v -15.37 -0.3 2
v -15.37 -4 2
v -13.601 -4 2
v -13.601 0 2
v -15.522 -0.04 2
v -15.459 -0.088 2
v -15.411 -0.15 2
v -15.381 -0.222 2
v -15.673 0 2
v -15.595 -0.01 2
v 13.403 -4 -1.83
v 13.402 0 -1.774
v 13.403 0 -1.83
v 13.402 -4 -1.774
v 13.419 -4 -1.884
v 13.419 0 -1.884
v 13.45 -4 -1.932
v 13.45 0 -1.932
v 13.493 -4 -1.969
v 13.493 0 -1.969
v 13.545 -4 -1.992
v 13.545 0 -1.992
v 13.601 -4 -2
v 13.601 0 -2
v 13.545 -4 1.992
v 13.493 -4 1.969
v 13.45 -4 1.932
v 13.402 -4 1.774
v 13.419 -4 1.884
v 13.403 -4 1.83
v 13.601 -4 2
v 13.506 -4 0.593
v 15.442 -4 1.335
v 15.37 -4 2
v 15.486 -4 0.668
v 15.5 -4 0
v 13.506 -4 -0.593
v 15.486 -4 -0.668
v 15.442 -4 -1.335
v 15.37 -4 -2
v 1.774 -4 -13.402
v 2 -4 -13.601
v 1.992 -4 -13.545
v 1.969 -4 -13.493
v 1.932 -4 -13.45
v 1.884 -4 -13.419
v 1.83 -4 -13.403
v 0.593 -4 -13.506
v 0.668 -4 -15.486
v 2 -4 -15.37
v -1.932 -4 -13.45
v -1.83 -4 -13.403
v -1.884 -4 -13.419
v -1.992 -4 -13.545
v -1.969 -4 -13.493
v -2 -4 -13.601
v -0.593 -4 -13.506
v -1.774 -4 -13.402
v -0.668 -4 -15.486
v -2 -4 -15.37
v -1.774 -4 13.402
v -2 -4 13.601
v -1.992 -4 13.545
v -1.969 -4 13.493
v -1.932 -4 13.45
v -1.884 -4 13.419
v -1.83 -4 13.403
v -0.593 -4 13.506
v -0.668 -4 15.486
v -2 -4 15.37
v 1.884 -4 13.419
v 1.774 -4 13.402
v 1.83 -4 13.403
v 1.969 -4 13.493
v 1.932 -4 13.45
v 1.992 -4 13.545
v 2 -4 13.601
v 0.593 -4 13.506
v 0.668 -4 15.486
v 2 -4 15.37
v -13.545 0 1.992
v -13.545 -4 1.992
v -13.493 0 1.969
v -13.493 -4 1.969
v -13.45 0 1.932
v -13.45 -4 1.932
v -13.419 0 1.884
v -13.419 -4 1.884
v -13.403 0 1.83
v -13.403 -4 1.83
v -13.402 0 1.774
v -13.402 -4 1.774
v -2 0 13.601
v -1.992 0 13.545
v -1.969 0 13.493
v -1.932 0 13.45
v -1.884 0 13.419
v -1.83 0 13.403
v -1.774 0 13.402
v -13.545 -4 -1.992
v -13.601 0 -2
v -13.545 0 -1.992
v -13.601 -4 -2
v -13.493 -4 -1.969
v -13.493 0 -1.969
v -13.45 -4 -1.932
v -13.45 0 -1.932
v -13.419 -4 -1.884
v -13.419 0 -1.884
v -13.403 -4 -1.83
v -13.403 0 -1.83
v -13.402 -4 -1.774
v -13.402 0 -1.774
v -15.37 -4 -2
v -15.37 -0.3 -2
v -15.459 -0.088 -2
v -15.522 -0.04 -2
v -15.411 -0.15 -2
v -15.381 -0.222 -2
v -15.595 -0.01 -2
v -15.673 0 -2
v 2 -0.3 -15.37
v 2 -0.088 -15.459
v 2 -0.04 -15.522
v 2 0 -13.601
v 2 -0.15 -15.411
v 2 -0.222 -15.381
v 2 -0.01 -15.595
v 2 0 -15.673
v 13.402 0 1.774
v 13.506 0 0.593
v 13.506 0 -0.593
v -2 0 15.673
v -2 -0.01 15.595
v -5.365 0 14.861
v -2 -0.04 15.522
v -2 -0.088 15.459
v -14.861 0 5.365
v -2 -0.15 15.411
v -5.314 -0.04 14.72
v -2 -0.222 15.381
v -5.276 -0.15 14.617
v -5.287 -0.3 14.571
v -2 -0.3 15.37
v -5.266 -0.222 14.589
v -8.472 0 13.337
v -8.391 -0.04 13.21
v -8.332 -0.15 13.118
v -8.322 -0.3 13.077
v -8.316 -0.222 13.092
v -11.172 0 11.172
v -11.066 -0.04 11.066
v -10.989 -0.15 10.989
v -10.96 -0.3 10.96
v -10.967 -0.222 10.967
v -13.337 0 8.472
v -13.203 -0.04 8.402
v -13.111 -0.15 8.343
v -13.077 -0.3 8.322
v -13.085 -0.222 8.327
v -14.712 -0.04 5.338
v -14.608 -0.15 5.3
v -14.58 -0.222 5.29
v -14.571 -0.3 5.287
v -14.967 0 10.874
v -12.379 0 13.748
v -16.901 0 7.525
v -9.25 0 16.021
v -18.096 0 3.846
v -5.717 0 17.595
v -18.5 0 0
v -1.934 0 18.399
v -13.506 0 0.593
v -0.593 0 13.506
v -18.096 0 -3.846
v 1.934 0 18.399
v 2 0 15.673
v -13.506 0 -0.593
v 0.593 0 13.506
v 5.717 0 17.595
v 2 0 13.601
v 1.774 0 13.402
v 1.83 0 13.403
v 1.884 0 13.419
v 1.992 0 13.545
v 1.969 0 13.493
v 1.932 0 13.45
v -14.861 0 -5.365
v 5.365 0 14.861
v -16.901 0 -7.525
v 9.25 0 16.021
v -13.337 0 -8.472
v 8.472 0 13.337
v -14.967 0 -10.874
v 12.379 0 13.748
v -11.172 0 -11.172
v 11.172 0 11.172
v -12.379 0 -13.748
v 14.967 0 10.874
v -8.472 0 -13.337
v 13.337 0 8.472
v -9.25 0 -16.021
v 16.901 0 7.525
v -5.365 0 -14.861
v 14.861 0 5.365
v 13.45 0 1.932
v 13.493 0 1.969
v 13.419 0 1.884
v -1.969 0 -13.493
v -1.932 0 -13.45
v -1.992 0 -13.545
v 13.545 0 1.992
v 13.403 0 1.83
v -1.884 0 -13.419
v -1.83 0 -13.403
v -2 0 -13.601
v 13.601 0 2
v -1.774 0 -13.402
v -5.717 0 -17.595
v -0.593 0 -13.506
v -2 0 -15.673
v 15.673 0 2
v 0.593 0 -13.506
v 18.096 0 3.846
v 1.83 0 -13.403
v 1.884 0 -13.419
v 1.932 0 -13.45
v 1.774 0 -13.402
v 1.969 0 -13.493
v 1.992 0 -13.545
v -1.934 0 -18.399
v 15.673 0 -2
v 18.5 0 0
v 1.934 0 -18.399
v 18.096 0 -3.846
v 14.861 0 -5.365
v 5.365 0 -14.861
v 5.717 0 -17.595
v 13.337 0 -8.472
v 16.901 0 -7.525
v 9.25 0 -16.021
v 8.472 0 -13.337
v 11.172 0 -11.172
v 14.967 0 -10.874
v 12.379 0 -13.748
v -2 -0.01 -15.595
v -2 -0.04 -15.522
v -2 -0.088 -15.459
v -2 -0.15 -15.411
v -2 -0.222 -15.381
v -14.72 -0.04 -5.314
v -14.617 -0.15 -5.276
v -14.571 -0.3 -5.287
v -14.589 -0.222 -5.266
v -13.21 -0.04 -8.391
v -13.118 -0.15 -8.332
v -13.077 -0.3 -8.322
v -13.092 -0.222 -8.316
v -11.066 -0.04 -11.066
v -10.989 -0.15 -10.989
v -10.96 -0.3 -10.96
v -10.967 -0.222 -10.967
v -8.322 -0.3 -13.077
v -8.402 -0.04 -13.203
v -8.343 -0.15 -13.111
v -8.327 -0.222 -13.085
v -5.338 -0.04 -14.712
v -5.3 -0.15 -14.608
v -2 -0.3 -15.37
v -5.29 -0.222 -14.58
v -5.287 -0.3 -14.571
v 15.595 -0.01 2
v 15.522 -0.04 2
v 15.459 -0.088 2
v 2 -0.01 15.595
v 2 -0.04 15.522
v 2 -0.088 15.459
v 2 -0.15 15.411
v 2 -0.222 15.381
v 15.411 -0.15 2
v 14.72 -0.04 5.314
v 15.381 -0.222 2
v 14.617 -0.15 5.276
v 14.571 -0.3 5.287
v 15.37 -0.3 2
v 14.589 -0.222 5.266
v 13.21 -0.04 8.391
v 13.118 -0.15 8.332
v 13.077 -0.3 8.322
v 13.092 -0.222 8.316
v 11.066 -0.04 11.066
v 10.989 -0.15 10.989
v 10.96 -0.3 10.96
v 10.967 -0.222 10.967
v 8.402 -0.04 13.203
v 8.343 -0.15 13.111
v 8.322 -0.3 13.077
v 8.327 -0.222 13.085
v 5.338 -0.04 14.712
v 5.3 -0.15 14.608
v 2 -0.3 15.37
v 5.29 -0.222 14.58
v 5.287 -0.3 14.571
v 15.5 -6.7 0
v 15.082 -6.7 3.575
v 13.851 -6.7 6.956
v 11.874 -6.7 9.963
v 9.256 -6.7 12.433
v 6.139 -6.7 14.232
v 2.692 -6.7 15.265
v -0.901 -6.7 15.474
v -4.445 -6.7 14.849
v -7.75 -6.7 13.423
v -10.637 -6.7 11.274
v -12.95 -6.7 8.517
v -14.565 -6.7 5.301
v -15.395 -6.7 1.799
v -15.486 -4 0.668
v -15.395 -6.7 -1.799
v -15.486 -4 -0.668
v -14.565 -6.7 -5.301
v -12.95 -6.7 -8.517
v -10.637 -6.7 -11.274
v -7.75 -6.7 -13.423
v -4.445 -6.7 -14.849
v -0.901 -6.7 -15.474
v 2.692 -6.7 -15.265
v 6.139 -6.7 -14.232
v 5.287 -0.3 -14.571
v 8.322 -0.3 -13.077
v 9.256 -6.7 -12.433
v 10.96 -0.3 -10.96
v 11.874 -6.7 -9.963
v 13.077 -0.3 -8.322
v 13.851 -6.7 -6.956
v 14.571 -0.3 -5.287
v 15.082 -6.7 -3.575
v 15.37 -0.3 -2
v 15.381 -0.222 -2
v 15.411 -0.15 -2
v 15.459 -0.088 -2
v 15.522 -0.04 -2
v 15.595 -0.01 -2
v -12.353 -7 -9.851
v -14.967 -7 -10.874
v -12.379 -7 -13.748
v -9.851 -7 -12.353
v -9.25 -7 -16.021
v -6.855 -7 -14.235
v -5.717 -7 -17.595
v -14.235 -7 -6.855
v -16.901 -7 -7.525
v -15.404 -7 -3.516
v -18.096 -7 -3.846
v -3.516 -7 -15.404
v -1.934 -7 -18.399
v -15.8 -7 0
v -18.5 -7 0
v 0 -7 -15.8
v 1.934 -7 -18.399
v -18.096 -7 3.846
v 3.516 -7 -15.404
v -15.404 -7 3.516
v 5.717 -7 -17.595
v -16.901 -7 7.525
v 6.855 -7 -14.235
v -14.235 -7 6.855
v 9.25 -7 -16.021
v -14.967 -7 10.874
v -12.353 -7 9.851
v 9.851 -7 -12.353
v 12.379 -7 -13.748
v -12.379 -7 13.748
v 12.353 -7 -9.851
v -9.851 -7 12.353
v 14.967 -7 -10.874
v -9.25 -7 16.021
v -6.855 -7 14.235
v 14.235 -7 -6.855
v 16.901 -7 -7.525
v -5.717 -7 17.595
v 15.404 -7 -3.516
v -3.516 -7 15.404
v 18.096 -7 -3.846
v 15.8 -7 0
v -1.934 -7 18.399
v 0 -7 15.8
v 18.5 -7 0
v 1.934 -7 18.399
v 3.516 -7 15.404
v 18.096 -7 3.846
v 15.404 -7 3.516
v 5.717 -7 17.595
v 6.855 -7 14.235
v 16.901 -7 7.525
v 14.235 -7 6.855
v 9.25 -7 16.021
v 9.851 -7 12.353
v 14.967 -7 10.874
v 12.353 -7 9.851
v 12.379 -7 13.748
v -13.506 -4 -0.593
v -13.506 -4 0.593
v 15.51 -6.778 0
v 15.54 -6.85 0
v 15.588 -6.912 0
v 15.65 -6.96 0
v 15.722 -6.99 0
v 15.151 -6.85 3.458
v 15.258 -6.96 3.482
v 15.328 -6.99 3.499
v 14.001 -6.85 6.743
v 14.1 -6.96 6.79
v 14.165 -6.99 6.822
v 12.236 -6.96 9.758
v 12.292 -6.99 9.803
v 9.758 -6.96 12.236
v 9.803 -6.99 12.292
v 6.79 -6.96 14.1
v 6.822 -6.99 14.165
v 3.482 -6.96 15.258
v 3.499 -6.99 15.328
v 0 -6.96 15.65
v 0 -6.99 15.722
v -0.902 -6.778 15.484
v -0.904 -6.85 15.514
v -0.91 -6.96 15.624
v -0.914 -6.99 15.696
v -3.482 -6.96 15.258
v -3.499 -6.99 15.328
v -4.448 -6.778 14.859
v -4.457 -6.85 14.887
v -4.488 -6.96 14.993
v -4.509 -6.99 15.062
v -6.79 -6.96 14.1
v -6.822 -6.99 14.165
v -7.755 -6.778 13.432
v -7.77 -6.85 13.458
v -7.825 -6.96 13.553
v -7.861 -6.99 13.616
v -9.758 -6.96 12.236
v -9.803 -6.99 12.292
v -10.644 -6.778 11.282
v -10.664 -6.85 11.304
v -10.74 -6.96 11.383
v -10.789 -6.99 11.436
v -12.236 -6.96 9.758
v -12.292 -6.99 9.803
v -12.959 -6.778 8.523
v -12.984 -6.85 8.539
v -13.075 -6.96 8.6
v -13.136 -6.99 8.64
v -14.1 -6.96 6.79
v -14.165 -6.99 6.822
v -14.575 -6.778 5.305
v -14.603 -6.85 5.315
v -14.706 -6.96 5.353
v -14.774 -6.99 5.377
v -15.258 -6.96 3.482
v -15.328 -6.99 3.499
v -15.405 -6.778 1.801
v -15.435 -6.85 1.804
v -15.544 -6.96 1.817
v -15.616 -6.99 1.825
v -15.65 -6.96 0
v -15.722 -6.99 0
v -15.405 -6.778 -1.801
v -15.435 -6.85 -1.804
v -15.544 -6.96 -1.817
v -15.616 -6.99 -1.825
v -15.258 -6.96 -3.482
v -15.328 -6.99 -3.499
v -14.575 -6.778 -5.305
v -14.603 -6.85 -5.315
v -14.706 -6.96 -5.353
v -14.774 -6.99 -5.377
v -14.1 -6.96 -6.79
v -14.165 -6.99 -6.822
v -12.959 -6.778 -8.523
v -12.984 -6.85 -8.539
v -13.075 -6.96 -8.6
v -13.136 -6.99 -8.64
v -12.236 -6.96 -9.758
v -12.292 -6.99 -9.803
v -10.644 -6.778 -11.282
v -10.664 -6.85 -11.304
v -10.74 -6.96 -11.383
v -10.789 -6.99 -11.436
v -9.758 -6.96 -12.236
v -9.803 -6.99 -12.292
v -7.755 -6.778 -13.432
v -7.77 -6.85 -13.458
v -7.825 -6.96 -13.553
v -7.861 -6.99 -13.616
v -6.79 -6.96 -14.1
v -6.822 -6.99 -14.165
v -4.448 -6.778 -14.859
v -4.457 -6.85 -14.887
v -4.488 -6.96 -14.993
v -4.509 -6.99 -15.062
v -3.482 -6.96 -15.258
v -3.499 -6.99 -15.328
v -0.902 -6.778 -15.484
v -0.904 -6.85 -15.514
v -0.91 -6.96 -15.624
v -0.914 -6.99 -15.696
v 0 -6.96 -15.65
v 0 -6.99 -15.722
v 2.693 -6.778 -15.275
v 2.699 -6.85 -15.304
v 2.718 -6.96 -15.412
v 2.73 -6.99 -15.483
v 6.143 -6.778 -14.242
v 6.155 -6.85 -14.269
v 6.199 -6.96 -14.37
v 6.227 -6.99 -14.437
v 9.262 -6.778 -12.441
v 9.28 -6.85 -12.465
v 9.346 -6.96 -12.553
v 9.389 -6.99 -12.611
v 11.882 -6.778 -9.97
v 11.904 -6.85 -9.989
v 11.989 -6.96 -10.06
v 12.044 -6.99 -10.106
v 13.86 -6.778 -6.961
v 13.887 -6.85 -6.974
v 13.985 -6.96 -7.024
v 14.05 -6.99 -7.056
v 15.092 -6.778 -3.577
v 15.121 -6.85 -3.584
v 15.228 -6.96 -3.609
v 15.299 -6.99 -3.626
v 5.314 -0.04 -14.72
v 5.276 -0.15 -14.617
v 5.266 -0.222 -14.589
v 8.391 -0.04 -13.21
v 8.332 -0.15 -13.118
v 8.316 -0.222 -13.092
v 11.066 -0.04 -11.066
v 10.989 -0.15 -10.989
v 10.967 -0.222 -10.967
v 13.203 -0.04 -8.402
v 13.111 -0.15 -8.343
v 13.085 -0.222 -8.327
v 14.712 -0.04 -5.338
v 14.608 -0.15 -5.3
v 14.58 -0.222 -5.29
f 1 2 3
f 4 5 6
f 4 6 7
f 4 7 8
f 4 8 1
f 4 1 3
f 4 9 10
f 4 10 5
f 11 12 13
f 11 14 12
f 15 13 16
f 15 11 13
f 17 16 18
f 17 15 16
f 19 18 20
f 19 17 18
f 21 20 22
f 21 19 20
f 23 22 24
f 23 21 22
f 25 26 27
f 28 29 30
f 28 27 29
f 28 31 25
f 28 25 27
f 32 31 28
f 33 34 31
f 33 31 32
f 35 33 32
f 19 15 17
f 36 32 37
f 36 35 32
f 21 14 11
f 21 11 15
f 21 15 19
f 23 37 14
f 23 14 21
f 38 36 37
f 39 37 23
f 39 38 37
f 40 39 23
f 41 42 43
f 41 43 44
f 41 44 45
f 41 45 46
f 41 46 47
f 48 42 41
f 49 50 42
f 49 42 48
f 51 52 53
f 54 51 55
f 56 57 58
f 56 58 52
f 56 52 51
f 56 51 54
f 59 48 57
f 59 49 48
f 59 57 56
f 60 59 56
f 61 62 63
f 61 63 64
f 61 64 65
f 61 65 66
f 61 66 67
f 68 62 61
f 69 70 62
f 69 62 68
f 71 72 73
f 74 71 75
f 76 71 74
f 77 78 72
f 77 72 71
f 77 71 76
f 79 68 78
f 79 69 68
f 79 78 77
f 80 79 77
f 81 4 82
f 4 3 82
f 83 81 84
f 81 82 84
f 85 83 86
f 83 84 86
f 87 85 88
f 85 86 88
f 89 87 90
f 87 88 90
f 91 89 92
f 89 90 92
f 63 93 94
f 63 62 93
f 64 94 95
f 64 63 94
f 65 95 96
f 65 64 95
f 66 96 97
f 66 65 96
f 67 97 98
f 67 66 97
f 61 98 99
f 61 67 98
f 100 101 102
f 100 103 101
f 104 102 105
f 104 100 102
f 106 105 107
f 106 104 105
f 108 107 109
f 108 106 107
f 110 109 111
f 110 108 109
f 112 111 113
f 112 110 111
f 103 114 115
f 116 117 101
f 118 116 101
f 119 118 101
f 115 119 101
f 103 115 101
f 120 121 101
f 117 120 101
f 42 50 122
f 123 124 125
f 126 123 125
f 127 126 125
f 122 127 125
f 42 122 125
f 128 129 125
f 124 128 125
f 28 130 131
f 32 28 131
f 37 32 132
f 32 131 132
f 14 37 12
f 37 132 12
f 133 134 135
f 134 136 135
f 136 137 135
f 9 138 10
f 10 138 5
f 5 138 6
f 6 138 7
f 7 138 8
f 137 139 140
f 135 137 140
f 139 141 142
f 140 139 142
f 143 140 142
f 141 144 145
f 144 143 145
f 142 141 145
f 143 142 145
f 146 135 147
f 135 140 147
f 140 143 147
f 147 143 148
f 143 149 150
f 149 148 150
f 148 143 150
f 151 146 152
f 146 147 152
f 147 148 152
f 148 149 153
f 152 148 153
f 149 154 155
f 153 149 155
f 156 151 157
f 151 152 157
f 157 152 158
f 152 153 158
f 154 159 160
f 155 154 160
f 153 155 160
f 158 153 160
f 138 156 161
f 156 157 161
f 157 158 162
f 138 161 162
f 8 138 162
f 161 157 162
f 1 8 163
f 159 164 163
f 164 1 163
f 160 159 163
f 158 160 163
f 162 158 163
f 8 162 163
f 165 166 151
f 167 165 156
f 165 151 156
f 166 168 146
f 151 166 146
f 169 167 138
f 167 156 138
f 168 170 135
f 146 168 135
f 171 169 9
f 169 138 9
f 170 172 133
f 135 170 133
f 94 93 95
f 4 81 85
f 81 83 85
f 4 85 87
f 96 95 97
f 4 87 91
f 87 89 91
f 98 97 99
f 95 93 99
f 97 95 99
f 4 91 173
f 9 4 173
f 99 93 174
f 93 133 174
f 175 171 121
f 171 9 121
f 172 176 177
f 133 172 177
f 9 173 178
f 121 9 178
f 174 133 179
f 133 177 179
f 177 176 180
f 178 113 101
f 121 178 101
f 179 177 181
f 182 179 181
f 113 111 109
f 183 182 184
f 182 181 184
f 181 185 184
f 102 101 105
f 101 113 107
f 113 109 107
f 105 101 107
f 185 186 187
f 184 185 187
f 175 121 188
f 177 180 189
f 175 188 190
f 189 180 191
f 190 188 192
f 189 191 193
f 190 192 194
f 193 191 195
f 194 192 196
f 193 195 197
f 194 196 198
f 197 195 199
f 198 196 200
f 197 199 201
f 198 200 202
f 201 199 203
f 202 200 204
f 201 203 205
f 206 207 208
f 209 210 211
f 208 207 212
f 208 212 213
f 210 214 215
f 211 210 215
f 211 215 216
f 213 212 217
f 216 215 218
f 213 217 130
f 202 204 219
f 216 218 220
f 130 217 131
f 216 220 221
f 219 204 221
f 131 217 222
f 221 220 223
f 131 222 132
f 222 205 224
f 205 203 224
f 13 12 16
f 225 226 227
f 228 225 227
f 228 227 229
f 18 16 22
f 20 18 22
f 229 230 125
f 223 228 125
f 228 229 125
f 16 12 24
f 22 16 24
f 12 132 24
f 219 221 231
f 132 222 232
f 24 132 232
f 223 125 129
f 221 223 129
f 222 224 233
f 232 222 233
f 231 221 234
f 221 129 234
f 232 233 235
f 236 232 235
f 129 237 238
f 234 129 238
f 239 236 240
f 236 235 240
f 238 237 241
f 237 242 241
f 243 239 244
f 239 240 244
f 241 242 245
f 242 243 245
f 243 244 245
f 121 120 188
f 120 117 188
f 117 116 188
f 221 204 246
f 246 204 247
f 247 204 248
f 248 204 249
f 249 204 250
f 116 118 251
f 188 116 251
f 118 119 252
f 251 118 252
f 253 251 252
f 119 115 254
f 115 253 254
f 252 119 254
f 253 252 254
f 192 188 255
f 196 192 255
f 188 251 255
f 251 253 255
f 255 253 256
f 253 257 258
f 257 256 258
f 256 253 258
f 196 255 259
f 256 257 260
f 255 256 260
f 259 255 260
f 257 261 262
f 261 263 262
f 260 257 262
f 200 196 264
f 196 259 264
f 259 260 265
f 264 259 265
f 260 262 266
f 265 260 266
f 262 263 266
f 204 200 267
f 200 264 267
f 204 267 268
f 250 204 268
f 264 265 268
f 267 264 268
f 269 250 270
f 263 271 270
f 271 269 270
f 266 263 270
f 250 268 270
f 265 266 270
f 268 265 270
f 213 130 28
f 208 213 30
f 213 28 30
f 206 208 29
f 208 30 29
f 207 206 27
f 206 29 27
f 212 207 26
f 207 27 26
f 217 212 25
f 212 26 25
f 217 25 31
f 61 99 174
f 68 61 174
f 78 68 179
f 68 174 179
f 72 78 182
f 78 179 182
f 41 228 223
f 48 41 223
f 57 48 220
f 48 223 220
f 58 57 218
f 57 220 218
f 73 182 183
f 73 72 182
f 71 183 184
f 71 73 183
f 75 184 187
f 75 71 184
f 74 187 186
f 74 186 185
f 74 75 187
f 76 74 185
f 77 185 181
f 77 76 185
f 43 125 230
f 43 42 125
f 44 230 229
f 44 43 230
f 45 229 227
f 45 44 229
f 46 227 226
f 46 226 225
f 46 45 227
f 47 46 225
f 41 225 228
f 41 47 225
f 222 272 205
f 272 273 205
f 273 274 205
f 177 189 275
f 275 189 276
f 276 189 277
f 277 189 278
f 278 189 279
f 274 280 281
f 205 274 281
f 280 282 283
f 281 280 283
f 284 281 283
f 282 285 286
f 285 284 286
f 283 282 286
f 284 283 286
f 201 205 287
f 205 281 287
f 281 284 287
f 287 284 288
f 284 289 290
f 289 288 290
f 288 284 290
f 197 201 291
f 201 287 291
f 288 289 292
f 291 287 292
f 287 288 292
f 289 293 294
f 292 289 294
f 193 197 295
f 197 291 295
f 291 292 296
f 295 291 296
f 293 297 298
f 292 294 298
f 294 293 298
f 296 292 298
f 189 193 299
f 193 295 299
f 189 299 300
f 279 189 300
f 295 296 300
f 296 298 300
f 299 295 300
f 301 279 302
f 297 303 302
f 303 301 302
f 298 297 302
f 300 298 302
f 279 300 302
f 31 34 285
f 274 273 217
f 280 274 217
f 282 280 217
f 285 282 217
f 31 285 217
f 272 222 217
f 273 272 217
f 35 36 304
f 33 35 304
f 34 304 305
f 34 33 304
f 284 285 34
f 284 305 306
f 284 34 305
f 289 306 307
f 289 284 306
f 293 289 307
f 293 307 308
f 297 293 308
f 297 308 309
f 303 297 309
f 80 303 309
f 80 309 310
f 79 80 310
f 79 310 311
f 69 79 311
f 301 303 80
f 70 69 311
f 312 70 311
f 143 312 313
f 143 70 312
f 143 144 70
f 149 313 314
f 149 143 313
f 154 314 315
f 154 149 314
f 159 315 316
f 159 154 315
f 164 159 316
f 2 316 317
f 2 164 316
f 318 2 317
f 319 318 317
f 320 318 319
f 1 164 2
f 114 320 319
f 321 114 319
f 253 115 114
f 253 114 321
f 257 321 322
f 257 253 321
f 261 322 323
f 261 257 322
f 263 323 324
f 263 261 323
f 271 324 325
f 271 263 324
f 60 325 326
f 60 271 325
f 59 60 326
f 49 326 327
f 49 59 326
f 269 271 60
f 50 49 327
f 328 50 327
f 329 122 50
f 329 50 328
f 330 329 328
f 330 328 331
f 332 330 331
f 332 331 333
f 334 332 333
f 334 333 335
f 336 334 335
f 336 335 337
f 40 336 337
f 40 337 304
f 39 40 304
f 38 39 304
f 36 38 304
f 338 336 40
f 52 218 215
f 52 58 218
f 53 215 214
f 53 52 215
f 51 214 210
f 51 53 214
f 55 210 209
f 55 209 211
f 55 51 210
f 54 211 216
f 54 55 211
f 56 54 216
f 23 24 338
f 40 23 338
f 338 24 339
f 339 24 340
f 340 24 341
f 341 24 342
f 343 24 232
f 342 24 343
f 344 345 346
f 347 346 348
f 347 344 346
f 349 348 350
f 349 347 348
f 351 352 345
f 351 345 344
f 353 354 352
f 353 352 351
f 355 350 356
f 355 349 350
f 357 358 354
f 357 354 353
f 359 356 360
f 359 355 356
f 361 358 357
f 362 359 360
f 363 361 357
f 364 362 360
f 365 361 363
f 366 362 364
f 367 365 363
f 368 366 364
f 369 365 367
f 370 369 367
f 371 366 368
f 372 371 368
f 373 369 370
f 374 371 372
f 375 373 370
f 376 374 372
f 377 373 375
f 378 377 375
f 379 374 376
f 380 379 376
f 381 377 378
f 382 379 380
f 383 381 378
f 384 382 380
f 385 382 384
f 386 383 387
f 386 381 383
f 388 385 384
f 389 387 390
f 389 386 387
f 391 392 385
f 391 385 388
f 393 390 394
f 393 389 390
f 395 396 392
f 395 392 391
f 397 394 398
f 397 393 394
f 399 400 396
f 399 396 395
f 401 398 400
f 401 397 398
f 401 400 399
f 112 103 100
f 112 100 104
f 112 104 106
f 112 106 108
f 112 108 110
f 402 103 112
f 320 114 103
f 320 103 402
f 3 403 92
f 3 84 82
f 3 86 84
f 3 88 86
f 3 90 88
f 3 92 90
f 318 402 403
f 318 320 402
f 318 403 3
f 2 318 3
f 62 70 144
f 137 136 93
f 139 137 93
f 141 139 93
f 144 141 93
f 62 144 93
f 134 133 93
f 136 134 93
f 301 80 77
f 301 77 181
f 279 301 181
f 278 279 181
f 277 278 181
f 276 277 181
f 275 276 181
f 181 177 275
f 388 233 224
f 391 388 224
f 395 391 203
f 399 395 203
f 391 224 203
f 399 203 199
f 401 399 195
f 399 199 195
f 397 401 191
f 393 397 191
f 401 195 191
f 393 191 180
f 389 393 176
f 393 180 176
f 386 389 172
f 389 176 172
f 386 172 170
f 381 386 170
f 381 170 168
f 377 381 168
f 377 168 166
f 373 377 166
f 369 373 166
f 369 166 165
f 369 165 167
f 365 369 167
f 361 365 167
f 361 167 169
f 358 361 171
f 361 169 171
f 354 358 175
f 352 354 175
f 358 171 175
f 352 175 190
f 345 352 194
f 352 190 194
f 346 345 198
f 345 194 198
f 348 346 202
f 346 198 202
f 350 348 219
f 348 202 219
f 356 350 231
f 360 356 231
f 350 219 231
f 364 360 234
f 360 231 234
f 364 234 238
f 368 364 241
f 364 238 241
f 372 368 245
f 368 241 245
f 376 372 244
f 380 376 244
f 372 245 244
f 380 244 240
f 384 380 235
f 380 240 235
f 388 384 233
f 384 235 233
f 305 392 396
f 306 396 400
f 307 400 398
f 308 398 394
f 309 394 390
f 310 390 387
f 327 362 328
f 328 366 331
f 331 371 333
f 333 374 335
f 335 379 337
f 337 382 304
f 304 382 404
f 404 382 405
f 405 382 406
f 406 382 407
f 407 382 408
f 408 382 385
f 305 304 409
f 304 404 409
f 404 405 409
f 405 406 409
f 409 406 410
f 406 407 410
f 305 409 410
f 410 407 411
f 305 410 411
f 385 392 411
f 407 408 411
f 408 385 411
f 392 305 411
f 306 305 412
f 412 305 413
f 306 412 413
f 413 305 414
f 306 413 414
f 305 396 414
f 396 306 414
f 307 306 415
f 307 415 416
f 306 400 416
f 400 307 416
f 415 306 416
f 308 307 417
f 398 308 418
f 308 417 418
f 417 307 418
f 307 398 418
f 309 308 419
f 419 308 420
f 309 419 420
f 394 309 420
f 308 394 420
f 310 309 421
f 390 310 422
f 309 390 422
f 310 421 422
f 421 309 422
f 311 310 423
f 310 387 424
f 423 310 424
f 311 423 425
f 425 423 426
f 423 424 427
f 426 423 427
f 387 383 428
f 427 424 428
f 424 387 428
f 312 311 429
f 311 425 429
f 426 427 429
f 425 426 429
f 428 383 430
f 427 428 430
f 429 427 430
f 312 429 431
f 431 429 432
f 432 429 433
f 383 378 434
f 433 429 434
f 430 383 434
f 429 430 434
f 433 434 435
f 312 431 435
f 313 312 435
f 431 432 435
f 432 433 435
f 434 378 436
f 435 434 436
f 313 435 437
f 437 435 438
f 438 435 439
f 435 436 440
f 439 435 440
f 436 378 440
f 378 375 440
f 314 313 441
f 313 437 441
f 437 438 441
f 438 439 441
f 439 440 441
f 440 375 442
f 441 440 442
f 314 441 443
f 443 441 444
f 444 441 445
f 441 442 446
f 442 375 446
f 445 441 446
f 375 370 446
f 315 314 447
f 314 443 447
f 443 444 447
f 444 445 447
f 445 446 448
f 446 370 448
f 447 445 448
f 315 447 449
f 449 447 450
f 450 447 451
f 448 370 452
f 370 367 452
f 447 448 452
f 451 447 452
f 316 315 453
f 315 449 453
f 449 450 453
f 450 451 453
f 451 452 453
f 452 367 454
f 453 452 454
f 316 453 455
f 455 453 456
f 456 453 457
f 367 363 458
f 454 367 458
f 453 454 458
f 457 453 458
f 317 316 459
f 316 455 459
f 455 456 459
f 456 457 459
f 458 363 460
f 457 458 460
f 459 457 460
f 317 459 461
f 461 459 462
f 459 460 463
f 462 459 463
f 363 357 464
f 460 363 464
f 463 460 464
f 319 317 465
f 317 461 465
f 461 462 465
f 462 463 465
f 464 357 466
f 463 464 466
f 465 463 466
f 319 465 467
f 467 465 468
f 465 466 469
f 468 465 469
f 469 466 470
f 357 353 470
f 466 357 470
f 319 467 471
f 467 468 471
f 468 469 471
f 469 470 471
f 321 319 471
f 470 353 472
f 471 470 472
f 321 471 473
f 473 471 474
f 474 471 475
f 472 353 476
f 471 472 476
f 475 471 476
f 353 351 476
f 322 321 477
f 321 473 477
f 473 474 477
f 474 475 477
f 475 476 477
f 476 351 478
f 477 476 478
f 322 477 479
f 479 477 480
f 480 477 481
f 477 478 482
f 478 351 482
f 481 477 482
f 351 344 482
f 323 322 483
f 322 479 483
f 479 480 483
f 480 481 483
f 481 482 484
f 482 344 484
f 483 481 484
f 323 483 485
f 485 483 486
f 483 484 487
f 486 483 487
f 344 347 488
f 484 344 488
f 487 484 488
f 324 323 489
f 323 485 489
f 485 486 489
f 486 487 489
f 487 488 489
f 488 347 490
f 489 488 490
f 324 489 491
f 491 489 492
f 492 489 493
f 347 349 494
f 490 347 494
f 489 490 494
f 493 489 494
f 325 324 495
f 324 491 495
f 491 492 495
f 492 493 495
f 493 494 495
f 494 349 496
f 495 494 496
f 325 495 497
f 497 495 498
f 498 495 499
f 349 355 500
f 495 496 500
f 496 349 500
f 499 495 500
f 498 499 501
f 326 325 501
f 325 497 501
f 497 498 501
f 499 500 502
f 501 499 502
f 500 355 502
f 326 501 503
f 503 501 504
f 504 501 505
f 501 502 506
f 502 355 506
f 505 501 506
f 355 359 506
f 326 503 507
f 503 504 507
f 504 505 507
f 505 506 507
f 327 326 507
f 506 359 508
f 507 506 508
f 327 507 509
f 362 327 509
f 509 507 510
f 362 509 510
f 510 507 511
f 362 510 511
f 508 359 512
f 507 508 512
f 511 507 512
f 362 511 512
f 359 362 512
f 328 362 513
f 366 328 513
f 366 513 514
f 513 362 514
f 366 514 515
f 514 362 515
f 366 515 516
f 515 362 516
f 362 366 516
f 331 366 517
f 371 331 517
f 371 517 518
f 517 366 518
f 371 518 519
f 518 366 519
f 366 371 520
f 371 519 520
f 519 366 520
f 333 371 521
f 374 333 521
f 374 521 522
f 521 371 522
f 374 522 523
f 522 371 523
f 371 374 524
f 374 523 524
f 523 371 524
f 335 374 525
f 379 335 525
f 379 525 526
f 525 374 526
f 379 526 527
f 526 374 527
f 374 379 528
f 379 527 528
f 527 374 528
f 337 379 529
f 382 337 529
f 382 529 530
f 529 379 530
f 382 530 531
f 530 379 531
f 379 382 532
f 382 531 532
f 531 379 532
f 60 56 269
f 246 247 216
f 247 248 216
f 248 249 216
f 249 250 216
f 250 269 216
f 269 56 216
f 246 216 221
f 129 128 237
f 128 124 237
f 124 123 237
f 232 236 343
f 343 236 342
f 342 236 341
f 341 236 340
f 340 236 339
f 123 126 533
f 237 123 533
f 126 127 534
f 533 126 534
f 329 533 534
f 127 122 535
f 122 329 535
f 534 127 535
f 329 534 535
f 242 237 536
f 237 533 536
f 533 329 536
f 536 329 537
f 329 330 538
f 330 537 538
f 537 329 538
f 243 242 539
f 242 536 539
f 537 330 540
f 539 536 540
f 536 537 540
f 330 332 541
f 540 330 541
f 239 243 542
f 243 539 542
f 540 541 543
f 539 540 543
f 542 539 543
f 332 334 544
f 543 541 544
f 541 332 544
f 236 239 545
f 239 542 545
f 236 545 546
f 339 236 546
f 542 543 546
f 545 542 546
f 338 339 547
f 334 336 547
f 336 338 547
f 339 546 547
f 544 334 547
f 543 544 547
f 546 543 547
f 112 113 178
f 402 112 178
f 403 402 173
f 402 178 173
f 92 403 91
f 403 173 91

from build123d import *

# Parameters (mm, degrees)
F0_R            = 18.5
F0_R_2          = 15.5
F1_DEPTH        = 7
F3_DEPTH        = 4
F3_COPIES_COUNT = 4
F4_R            = 0.2
F5_T6_ANGLE     = 80.7189590371
F5_T12_ANGLE    = 80.7189590371
F5_T18_ANGLE    = 80.7189590371
F5_T24_ANGLE    = 80.7189590371


# Not quite as in the source:
# - a fillet or chamfer that OpenCascade refuses, or shapes differently, is made with other operations: its cross-section is extruded or revolved along the edge and cut away or added
# - a pattern or mirror of a feature is missing from the dataset's text; its kind, count and spacing are read off the source's solid


with BuildPart() as f1:
    # F0 (on Front) → F1 (new body)
    with BuildSketch(Plane.XZ):
        Circle(F0_R)
        Circle(F0_R_2, mode=Mode.SUBTRACT)
    extrude(amount=F1_DEPTH)

    # F2 (on Front) → F3 (join)
    with BuildSketch(Plane.XZ):
        with BuildLine():
            ThreePointArc((-2, 13.3704261489), (0, 13.5191824976), (2, 13.3704261489))
            Line((2, 13.3704261489), (2, 15.3704261489))
            ThreePointArc((2, 15.3704261489), (0, 15.5), (-2, 15.3704261489))
            Line((-2, 15.3704261489), (-2, 13.3704261489))
        make_face()
    f3 = extrude(amount=F3_DEPTH)

    # F3_copies: F3 ×4 about axis
    f3_copies_axis = Axis((0, 0, 0), (0, 1, 0))
    for i in range(1, F3_COPIES_COUNT):
        add(f3.rotate(f3_copies_axis, i * 360 / F3_COPIES_COUNT))

    # F4
    f4_edges = [f1.edges().sort_by_distance(p)[0] for p in [
        (2, -2, 13.370426),
        (-2, -2, 13.370426),
        (13.370426, -2, 2),
        (13.370426, -2, -2),
        (2, -2, -13.370426),
        (-2, -2, -13.370426),
        (-13.370426, -2, 2),
        (-13.370426, -2, -2),
    ]]
    fillet(f4_edges, radius=F4_R)

    # F5: fillet of radius 0.3 on 5 edges, made by hand

    # F5_s1 → F5_t2 (revolve, cut)
    with BuildSketch(Plane.XY):
        with BuildLine():
            ThreePointArc((15.5, -6.7), (15.5878679656, -6.9121320344), (15.8, -7))
            Line((15.8, -7), (15.5, -7))
            Line((15.5, -7), (15.5, -6.7))
        make_face()
    revolve(axis=Axis((0, -7, 0), (0, -1, 0)), mode=Mode.SUBTRACT)


with BuildPart() as f5_tool4:
    # F5_s5 → F5_t6 (revolve)
    with BuildSketch(Plane(origin=(0, 0, 0), x_dir=(0, 1, 0), z_dir=(0.080903842, 0, -0.9967219112))):
        with BuildLine():
            ThreePointArc((0, 15.8), (-0.0878679656, 15.5878679656), (-0.3, 15.5))
            Line((-0.3, 15.5), (0, 15.5))
            Line((0, 15.5), (0, 15.8))
        make_face()
    revolve(axis=Axis((0, 0, 0), (0, -1, 0)), revolution_arc=F5_T6_ANGLE)

    split(bisect_by=Plane.XY.offset(2), keep=Keep.TOP)

    split(bisect_by=Plane.YZ.offset(2), keep=Keep.TOP)


with BuildPart() as f1_1:
    add(f1.part)

    # F5_t3: cut F5_tool4
    add(f5_tool4.part, mode=Mode.SUBTRACT)


with BuildPart() as f5_tool10:
    # F5_s11 → F5_t12 (revolve)
    with BuildSketch(Plane(origin=(0, 0, 0), x_dir=(0, 1, 0), z_dir=(-0.9967219112, 0, -0.080903842))):
        with BuildLine():
            ThreePointArc((0, 15.8), (-0.0878679656, 15.5878679656), (-0.3, 15.5))
            Line((-0.3, 15.5), (0, 15.5))
            Line((0, 15.5), (0, 15.8))
        make_face()
    revolve(axis=Axis((0, 0, 0), (0, -1, 0)), revolution_arc=F5_T12_ANGLE)

    split(bisect_by=Plane.XY.offset(-2), keep=Keep.BOTTOM)

    split(bisect_by=Plane.YZ.offset(2), keep=Keep.TOP)


with BuildPart() as f1_2:
    add(f1_1.part)

    # F5_t9: cut F5_tool10
    add(f5_tool10.part, mode=Mode.SUBTRACT)


with BuildPart() as f5_tool16:
    # F5_s17 → F5_t18 (revolve)
    with BuildSketch(Plane(origin=(0, 0, 0), x_dir=(0, 1, 0), z_dir=(0.9967219112, 0, 0.080903842))):
        with BuildLine():
            ThreePointArc((0, 15.8), (-0.0878679656, 15.5878679656), (-0.3, 15.5))
            Line((-0.3, 15.5), (0, 15.5))
            Line((0, 15.5), (0, 15.8))
        make_face()
    revolve(axis=Axis((0, 0, 0), (0, -1, 0)), revolution_arc=F5_T18_ANGLE)

    split(bisect_by=Plane.YZ.offset(-2), keep=Keep.BOTTOM)

    split(bisect_by=Plane.XY.offset(2), keep=Keep.TOP)


with BuildPart() as f1_3:
    add(f1_2.part)

    # F5_t15: cut F5_tool16
    add(f5_tool16.part, mode=Mode.SUBTRACT)


with BuildPart() as f5_tool22:
    # F5_s23 → F5_t24 (revolve)
    with BuildSketch(Plane(origin=(0, 0, 0), x_dir=(0, 1, 0), z_dir=(-0.080903842, 0, 0.9967219112))):
        with BuildLine():
            ThreePointArc((0, 15.8), (-0.0878679656, 15.5878679656), (-0.3, 15.5))
            Line((-0.3, 15.5), (0, 15.5))
            Line((0, 15.5), (0, 15.8))
        make_face()
    revolve(axis=Axis((0, 0, 0), (0, -1, 0)), revolution_arc=F5_T24_ANGLE)

    split(bisect_by=Plane.YZ.offset(-2), keep=Keep.BOTTOM)

    split(bisect_by=Plane.XY.offset(-2), keep=Keep.BOTTOM)


with BuildPart() as f1_4:
    add(f1_3.part)

    # F5_t21: cut F5_tool22
    add(f5_tool22.part, mode=Mode.SUBTRACT)


solid = f1_4.part
